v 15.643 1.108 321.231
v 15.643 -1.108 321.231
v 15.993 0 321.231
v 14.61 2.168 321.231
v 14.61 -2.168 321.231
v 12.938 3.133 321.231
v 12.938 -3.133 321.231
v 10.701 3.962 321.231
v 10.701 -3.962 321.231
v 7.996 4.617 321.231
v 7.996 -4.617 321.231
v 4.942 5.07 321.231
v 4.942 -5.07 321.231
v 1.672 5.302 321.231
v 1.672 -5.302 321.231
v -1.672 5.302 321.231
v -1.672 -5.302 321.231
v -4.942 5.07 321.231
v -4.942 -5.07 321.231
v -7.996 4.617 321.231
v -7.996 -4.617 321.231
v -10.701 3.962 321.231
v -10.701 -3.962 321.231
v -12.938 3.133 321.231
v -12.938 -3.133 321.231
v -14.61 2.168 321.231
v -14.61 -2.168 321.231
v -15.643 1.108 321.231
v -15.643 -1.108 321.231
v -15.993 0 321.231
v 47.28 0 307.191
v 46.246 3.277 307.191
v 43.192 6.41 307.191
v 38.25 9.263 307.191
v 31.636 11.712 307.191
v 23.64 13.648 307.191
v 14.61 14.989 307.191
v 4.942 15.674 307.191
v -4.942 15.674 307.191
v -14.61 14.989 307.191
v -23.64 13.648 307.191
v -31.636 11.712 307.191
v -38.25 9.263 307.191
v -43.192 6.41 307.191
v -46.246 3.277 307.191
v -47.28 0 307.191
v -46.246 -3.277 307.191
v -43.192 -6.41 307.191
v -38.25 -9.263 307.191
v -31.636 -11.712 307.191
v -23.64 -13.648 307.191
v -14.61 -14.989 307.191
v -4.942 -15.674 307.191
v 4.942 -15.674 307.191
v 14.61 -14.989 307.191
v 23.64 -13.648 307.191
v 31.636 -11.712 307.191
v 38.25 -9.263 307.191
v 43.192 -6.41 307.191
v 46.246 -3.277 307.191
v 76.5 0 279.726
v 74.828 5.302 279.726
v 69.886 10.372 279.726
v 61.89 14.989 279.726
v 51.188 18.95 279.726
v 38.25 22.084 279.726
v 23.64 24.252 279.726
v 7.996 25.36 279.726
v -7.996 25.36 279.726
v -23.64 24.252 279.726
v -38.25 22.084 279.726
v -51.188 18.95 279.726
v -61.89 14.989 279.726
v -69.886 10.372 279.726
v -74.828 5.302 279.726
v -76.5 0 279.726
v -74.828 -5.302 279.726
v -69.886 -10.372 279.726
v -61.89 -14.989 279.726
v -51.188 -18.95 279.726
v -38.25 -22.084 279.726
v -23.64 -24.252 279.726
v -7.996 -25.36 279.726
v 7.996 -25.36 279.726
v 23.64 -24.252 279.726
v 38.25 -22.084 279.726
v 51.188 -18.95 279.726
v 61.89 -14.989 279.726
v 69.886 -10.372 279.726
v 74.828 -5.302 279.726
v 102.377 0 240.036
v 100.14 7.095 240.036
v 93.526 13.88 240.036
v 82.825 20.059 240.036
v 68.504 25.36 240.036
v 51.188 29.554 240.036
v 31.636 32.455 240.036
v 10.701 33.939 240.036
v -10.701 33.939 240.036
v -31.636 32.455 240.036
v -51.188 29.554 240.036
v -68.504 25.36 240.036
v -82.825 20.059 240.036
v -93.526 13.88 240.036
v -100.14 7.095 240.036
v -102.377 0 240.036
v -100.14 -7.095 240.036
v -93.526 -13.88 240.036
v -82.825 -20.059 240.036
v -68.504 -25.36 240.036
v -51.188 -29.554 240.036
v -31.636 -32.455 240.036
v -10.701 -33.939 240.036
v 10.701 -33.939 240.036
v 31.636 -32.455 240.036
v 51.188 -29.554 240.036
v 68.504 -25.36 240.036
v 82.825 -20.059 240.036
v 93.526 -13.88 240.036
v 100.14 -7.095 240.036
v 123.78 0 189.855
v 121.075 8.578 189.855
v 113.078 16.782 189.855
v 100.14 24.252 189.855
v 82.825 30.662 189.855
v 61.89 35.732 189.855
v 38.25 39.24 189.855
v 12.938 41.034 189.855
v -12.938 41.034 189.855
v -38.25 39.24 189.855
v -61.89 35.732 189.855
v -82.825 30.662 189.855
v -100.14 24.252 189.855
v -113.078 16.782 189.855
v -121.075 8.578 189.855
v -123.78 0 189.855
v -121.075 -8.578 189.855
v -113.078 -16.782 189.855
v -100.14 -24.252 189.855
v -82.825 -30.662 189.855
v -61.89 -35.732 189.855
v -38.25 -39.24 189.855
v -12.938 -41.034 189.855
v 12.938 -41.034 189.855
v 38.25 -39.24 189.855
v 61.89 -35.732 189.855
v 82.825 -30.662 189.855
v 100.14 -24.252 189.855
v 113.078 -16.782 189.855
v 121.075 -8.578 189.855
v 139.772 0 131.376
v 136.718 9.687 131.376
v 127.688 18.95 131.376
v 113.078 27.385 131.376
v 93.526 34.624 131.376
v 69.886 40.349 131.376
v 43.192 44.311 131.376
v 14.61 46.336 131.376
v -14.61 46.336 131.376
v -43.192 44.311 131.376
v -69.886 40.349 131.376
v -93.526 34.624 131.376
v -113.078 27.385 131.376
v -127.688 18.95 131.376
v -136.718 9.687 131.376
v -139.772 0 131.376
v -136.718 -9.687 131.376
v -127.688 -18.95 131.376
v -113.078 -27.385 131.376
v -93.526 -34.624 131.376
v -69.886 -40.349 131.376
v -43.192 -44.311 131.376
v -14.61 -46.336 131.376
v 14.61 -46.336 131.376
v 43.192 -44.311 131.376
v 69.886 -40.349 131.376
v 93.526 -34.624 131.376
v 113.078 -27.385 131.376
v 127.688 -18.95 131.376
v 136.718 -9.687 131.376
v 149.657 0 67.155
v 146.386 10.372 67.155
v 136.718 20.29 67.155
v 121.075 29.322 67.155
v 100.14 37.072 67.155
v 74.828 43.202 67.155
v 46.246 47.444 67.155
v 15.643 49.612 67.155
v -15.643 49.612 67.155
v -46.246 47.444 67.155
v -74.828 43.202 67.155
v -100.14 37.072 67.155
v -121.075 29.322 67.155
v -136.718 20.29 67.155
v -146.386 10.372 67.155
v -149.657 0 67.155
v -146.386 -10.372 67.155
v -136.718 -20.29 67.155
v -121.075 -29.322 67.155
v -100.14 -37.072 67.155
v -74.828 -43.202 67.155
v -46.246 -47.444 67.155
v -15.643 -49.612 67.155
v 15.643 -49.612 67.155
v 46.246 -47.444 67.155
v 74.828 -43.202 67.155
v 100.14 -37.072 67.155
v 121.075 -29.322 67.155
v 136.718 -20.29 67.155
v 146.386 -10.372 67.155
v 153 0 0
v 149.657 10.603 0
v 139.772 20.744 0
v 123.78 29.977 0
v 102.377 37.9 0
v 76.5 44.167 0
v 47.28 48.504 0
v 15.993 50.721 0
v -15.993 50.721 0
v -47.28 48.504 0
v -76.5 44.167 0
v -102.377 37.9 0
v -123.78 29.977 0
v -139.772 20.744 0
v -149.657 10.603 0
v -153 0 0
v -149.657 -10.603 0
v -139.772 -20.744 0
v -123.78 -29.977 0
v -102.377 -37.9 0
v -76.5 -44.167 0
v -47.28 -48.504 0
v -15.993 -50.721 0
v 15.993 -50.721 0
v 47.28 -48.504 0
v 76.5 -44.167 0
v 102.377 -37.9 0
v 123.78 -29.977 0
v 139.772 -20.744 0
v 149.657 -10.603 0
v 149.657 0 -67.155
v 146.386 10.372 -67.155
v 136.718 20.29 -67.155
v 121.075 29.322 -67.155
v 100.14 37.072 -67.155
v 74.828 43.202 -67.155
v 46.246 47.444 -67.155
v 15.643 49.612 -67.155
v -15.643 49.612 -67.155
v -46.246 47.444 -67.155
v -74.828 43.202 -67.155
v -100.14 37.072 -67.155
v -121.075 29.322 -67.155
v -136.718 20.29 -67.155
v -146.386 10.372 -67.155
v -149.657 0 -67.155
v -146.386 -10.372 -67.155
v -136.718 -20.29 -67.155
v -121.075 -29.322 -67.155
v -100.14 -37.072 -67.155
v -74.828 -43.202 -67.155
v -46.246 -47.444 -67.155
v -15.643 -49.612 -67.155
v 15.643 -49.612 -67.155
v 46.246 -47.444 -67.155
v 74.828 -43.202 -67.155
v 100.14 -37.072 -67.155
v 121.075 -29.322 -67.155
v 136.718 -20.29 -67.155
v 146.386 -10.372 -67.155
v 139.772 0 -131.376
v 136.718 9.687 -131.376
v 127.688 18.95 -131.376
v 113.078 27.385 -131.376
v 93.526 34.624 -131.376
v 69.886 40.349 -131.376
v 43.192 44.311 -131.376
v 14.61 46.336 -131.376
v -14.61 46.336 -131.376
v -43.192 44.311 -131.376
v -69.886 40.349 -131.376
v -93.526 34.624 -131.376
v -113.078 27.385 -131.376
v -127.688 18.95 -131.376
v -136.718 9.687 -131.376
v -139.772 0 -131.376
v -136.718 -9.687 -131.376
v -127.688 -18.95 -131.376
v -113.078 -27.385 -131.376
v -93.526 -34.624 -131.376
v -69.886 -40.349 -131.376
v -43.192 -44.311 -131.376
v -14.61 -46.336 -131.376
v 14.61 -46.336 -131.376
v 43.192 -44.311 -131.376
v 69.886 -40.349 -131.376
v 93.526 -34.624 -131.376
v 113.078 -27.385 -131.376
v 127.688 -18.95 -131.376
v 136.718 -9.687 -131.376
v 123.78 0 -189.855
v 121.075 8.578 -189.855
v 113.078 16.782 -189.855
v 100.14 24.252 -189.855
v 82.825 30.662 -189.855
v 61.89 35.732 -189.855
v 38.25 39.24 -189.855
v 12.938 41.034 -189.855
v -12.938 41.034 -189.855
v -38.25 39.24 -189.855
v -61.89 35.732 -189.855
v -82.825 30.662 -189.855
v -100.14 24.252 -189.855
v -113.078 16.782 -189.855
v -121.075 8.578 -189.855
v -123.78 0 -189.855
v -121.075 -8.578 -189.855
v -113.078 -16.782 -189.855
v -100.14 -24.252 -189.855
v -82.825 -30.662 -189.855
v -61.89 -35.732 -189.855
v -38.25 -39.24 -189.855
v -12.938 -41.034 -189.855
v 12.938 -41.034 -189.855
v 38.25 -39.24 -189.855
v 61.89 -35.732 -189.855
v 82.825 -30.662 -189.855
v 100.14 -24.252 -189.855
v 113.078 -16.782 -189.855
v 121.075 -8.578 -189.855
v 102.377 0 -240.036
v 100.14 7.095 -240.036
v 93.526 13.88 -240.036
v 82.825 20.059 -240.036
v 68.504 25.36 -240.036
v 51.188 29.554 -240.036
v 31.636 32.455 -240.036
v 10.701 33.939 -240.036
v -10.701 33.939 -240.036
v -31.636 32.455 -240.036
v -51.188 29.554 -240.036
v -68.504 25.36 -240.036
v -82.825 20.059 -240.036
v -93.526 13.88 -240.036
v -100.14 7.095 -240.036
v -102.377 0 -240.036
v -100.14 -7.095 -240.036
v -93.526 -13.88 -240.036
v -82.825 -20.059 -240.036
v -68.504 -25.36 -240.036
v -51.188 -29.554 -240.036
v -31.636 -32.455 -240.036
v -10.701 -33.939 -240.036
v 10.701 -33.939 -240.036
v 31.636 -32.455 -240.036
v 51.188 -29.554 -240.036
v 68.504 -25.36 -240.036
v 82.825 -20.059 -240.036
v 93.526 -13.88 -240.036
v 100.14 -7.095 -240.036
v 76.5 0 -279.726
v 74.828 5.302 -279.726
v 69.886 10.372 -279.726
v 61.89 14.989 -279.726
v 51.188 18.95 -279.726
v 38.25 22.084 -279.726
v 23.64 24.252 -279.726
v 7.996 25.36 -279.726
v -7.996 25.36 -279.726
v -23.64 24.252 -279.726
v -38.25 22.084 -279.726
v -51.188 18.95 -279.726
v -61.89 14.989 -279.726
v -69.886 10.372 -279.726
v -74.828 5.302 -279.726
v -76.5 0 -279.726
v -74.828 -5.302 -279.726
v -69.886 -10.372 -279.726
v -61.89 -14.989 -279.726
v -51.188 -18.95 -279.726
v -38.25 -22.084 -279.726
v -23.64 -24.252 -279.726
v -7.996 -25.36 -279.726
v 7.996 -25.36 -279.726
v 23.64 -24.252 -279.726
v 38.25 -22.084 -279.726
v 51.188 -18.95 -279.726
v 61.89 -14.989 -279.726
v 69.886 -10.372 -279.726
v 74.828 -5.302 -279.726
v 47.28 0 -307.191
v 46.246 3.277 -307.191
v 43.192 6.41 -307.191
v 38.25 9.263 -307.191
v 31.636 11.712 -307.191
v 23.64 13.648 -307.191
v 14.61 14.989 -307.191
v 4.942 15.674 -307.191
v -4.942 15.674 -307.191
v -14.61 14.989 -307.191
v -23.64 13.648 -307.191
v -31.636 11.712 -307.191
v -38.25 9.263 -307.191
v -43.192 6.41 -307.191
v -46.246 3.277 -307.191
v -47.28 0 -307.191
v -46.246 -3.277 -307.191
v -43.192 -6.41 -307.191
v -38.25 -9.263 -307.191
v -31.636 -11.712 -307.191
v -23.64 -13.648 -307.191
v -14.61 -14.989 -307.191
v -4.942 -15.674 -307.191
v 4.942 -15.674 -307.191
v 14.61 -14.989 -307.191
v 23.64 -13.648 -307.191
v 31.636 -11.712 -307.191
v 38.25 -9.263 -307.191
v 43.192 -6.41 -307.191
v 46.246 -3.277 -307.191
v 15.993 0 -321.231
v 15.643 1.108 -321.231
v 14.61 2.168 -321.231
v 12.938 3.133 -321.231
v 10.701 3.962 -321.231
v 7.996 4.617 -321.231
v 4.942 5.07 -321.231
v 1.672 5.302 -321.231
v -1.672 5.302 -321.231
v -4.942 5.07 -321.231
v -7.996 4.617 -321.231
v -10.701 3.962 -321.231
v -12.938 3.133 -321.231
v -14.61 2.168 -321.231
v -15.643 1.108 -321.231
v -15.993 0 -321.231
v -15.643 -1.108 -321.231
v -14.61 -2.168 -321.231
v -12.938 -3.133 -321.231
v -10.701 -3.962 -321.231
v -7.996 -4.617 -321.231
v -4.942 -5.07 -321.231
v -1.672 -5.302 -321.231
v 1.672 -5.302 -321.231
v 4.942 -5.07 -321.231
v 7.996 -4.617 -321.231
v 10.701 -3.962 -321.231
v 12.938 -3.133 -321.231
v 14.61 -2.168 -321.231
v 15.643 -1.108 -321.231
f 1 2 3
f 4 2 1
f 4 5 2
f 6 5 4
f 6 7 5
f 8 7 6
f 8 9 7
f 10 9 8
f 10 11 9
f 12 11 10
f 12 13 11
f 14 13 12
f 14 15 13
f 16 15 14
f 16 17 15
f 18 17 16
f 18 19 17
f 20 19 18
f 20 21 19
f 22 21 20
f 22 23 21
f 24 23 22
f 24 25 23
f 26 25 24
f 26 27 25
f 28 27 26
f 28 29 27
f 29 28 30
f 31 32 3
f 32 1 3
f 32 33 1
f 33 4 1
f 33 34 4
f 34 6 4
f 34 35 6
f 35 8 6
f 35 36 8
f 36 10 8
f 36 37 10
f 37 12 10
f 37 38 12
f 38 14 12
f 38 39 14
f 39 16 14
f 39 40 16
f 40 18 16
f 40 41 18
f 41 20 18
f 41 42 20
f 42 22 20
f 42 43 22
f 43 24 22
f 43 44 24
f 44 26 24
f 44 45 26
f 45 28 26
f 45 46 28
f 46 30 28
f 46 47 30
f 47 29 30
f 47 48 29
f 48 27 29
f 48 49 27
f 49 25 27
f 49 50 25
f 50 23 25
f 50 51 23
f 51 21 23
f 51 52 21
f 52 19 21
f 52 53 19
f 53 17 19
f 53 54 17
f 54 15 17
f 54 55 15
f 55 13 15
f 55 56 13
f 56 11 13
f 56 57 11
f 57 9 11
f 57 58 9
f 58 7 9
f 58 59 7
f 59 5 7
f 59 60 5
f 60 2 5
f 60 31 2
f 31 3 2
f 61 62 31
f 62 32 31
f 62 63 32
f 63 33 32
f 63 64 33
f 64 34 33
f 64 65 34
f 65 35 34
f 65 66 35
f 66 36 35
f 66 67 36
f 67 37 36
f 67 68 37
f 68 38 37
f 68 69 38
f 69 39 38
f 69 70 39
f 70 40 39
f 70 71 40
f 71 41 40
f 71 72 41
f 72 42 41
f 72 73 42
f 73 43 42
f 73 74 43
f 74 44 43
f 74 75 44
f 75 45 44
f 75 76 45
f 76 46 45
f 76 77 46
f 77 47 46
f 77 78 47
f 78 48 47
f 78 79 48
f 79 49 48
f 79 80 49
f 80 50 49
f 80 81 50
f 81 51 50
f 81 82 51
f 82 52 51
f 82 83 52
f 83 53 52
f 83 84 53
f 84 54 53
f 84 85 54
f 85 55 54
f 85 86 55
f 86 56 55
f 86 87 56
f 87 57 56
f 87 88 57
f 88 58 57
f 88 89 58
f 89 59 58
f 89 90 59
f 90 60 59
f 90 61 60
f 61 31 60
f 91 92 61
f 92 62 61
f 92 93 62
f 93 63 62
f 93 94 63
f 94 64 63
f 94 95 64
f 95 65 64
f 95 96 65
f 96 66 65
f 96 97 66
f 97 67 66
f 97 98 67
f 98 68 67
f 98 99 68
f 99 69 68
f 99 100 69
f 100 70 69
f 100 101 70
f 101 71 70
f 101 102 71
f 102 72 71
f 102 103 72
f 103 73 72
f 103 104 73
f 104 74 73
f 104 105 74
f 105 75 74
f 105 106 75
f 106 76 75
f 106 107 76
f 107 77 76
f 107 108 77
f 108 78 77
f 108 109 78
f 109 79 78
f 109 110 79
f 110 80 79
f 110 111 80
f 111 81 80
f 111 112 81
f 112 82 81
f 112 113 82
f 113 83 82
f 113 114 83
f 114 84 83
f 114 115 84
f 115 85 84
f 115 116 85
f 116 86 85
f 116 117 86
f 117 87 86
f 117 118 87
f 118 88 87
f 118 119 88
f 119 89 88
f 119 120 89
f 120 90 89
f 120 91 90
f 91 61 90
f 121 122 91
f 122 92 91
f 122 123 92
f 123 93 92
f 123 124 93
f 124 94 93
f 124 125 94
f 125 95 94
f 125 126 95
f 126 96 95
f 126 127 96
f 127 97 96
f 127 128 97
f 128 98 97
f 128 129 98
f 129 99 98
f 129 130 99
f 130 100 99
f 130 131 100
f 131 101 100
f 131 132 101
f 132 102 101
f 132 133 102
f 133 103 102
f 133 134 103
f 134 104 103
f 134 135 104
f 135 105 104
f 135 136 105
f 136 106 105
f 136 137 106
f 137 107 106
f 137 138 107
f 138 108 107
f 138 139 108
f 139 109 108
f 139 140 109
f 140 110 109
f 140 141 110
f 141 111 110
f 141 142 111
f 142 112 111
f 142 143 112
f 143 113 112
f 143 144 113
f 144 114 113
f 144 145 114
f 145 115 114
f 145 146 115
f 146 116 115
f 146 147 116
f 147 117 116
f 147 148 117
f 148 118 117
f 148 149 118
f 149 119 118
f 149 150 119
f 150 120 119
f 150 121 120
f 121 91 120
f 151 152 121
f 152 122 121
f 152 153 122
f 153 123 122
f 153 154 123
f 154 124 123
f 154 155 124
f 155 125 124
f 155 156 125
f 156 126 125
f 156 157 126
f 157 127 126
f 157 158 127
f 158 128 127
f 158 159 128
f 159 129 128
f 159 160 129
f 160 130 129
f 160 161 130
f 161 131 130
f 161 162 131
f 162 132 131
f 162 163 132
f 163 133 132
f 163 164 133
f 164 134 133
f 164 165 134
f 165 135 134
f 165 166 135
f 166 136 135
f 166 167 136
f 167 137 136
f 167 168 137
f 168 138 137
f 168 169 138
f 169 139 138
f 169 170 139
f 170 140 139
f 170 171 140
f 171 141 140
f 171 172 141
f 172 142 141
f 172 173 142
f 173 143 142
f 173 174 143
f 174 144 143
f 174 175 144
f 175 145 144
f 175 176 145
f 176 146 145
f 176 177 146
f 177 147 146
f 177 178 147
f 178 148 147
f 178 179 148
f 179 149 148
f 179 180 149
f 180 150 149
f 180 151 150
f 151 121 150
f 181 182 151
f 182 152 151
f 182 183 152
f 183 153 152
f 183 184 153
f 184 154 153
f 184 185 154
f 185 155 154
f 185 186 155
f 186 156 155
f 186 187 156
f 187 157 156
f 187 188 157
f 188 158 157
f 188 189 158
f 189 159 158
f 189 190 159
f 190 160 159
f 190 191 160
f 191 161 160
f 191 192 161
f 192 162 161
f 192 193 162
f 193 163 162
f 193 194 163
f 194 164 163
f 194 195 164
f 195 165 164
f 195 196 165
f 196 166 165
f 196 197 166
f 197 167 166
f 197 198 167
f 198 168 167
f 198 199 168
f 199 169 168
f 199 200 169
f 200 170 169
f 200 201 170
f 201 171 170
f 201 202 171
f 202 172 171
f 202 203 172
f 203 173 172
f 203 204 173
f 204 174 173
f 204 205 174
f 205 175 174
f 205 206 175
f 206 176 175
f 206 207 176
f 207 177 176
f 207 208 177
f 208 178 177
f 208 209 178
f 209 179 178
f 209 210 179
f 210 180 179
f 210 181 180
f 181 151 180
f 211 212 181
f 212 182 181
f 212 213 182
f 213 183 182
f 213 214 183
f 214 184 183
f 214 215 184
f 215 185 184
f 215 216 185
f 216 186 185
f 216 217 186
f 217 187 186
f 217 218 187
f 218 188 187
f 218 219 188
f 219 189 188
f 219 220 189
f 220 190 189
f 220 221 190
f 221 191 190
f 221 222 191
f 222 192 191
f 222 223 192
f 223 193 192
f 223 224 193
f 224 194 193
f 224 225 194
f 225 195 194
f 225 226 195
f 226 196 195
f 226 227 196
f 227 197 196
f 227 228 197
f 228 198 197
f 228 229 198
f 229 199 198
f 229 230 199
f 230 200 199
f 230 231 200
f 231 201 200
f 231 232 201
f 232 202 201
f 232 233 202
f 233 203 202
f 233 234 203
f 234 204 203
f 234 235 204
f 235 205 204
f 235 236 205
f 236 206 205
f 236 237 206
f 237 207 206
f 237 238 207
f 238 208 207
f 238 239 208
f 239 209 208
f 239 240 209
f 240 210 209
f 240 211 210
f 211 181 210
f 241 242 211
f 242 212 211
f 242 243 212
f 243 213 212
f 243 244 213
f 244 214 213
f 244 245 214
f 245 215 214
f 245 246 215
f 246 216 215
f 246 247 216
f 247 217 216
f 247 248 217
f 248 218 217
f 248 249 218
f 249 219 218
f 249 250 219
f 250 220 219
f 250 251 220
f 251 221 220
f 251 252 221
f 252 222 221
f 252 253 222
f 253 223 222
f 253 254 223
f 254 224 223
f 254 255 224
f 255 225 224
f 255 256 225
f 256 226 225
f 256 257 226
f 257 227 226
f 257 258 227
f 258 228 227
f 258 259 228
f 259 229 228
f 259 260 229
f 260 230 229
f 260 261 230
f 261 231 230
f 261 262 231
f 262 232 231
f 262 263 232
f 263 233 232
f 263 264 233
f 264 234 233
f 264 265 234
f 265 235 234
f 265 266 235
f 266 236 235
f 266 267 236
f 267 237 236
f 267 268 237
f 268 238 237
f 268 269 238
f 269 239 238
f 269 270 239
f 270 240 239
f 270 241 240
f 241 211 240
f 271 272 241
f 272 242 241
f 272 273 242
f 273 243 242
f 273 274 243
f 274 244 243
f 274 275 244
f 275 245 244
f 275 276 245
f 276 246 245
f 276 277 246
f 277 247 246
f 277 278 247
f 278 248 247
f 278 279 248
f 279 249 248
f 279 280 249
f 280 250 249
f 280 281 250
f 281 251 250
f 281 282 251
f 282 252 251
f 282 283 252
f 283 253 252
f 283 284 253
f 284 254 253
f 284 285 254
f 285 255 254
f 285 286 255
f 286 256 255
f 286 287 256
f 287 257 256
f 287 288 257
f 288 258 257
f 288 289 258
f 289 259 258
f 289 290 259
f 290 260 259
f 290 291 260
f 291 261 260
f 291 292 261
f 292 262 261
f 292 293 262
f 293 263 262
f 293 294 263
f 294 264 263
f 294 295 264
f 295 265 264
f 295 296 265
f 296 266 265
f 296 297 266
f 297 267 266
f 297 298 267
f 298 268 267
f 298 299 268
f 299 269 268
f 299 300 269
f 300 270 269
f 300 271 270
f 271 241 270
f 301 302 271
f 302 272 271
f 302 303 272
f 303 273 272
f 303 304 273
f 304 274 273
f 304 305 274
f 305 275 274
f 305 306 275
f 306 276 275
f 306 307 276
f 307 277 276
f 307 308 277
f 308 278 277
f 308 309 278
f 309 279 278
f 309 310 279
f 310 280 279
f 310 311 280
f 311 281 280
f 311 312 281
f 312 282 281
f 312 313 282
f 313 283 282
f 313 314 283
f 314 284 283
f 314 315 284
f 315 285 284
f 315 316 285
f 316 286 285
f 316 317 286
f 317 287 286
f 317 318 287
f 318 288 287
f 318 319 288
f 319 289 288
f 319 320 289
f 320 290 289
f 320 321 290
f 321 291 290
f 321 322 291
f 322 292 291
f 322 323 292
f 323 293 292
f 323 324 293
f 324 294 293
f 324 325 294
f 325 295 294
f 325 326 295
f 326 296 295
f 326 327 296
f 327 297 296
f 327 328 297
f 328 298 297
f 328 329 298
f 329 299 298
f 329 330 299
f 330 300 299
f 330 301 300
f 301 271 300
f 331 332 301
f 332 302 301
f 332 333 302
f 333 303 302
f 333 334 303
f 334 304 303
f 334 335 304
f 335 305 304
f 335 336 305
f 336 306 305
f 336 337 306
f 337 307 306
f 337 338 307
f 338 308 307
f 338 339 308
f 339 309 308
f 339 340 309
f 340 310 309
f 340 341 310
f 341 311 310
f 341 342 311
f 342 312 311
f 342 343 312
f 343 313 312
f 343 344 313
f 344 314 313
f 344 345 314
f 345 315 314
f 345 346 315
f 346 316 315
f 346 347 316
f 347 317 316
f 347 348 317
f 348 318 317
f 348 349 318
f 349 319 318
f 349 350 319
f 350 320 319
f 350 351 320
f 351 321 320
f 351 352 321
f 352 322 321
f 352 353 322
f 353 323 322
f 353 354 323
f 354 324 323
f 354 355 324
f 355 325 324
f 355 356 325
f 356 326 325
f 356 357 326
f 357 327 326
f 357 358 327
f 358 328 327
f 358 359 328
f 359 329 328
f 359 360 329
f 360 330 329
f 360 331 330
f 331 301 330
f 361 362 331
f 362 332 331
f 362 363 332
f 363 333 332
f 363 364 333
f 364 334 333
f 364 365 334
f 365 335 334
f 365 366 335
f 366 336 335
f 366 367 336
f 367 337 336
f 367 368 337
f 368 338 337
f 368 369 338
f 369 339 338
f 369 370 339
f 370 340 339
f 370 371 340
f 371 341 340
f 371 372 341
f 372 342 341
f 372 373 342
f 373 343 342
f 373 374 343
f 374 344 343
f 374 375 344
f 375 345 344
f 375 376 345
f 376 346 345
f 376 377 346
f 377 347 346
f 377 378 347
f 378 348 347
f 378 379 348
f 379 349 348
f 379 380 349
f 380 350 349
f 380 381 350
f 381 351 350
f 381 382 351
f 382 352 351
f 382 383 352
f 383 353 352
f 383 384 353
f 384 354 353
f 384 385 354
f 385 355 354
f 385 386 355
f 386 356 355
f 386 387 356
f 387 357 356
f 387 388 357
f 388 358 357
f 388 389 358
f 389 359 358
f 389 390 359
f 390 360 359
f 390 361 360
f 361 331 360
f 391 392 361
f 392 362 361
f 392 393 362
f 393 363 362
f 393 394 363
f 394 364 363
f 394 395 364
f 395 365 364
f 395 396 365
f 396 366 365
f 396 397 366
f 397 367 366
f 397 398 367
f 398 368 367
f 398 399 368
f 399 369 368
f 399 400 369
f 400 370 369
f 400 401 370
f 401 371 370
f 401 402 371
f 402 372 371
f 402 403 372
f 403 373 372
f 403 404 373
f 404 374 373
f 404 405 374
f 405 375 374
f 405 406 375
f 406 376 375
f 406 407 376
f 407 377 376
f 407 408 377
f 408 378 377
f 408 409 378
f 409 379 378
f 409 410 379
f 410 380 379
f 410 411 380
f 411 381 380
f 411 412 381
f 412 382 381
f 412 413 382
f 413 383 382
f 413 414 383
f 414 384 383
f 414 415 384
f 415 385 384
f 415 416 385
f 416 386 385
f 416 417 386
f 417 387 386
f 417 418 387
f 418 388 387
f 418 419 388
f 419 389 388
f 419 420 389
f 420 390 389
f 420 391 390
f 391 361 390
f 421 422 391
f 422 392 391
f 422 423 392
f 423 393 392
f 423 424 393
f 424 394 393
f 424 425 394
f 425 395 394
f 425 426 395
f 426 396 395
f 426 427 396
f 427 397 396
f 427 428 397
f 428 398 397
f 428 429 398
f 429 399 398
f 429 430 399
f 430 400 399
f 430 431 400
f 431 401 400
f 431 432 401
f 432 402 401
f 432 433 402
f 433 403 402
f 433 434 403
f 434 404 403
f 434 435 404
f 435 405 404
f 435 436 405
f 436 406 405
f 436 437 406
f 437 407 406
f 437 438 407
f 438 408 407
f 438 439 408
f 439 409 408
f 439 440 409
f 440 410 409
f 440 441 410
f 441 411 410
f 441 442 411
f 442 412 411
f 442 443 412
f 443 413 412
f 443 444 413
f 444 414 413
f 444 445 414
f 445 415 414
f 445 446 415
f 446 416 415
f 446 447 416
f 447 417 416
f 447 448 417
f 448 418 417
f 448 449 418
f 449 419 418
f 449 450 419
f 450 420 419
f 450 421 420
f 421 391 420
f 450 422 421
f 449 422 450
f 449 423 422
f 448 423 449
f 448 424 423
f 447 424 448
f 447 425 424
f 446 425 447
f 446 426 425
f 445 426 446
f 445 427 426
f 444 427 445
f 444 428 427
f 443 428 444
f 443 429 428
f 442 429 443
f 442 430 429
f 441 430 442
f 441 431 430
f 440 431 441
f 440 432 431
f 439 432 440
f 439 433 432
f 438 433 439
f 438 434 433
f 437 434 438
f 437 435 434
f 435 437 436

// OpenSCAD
// Generated by SolidPython 1.0.1 on 2020-07-29 00:46:48


scale(v = [9, 3, 19]) {
	sphere(r = 17);
}
/***********************************************
*********      SolidPython code:      **********
************************************************
 
# import packages: SolidPython
from solid import *
from solid.utils import *
from itertools import chain, combinations, permutations


class Resize:

    def __init__(self, scad_file):
        self.scad_file = scad_file
        #self.scad_file = import_scad(scad_file)
        # cone/cylinder param:
        self.r1 = 0
        self.r2 = 0
        self.h = 0
        # rectangular prism param:
        self.w = 0
        self.l = 0
        # ellipse param:
        self.r = 0

    # import OpenScad code (file name corresponds to shape)


    # classify shape + parameters
    def assign(self, param1, param2, param3):
        if self.scad_file == 'cone.scad':
            self.r1 = param1
            self.r2 = param2
            self.h = param3
        elif self.scad_file == 'cylinder.scad':
            self.r1 = param1
            self.r2 = param2
            self.h = param3
        elif self.scad_file == 'rectangularPrism.scad':
            self.h = param1
            self.l = param2
            self.w = param3
        else:
            self.r = param1
            self.h = param2

    # resize parameters
    def iterate(self):
        x = range(3, 20, 2)
        i = 1
        if self.scad_file == 'cone.scad':
            tempList = list(permutations(x, 2))
            for temp in tempList:
                param1 = temp[0]
                param2 = temp[1]
                filepath = 'produced_scad_files/' + 'cone' + str(param1) + '_' + str(param2) + '_' + '.scad'
                scad_render_to_file(cylinder(h=param1, r1=param2, r2=0), filepath)

        elif self.scad_file == 'cylinder.scad':
            tempList = list(permutations(x, 3))
            for temp in tempList:
                param1 = temp[0]
                param2 = temp[1]
                filepath = 'produced_scad_files/' + 'cylinder' + str(param1) + '_' + str(param2) + '_' + '.scad'
                scad_render_to_file(cylinder(h=param1, r1=param2, r2=param2), filepath)

        elif self.scad_file == 'rectangularPrism.scad':
            tempList = list(permutations(x, 3))
            for temp in tempList:
                param1 = temp[0]
                param2 = temp[1]
                param3 = temp[2]
                filepath = 'produced_scad_files/' + 'rectangularPrism' + str(param1) + '_' + str(param2) + '_' + str(
                    param3) + '.scad'
                scad_render_to_file(cube(size=(param1, param2, param3)), filepath)

        elif self.scad_file == 'ellipse.scad':
            tempList = list(permutations(x, 4))
            for temp in tempList:
                param1 = temp[0]
                param2 = temp[1]
                param3 = temp[2]
                param4 = temp[3]
                filepath = 'produced_scad_files/' + 'ellipse' + str(param1) + '_' + str(param2) + '_' + str(param3) + '_' + str(param4) + '.scad'
                scad_render_to_file(scale([param1, param2, param3])(sphere(r=param4)), filepath)

    def render_to_scadfile(self):
        scad_render_to_file(scad, 'example.scad') 
 
************************************************/
